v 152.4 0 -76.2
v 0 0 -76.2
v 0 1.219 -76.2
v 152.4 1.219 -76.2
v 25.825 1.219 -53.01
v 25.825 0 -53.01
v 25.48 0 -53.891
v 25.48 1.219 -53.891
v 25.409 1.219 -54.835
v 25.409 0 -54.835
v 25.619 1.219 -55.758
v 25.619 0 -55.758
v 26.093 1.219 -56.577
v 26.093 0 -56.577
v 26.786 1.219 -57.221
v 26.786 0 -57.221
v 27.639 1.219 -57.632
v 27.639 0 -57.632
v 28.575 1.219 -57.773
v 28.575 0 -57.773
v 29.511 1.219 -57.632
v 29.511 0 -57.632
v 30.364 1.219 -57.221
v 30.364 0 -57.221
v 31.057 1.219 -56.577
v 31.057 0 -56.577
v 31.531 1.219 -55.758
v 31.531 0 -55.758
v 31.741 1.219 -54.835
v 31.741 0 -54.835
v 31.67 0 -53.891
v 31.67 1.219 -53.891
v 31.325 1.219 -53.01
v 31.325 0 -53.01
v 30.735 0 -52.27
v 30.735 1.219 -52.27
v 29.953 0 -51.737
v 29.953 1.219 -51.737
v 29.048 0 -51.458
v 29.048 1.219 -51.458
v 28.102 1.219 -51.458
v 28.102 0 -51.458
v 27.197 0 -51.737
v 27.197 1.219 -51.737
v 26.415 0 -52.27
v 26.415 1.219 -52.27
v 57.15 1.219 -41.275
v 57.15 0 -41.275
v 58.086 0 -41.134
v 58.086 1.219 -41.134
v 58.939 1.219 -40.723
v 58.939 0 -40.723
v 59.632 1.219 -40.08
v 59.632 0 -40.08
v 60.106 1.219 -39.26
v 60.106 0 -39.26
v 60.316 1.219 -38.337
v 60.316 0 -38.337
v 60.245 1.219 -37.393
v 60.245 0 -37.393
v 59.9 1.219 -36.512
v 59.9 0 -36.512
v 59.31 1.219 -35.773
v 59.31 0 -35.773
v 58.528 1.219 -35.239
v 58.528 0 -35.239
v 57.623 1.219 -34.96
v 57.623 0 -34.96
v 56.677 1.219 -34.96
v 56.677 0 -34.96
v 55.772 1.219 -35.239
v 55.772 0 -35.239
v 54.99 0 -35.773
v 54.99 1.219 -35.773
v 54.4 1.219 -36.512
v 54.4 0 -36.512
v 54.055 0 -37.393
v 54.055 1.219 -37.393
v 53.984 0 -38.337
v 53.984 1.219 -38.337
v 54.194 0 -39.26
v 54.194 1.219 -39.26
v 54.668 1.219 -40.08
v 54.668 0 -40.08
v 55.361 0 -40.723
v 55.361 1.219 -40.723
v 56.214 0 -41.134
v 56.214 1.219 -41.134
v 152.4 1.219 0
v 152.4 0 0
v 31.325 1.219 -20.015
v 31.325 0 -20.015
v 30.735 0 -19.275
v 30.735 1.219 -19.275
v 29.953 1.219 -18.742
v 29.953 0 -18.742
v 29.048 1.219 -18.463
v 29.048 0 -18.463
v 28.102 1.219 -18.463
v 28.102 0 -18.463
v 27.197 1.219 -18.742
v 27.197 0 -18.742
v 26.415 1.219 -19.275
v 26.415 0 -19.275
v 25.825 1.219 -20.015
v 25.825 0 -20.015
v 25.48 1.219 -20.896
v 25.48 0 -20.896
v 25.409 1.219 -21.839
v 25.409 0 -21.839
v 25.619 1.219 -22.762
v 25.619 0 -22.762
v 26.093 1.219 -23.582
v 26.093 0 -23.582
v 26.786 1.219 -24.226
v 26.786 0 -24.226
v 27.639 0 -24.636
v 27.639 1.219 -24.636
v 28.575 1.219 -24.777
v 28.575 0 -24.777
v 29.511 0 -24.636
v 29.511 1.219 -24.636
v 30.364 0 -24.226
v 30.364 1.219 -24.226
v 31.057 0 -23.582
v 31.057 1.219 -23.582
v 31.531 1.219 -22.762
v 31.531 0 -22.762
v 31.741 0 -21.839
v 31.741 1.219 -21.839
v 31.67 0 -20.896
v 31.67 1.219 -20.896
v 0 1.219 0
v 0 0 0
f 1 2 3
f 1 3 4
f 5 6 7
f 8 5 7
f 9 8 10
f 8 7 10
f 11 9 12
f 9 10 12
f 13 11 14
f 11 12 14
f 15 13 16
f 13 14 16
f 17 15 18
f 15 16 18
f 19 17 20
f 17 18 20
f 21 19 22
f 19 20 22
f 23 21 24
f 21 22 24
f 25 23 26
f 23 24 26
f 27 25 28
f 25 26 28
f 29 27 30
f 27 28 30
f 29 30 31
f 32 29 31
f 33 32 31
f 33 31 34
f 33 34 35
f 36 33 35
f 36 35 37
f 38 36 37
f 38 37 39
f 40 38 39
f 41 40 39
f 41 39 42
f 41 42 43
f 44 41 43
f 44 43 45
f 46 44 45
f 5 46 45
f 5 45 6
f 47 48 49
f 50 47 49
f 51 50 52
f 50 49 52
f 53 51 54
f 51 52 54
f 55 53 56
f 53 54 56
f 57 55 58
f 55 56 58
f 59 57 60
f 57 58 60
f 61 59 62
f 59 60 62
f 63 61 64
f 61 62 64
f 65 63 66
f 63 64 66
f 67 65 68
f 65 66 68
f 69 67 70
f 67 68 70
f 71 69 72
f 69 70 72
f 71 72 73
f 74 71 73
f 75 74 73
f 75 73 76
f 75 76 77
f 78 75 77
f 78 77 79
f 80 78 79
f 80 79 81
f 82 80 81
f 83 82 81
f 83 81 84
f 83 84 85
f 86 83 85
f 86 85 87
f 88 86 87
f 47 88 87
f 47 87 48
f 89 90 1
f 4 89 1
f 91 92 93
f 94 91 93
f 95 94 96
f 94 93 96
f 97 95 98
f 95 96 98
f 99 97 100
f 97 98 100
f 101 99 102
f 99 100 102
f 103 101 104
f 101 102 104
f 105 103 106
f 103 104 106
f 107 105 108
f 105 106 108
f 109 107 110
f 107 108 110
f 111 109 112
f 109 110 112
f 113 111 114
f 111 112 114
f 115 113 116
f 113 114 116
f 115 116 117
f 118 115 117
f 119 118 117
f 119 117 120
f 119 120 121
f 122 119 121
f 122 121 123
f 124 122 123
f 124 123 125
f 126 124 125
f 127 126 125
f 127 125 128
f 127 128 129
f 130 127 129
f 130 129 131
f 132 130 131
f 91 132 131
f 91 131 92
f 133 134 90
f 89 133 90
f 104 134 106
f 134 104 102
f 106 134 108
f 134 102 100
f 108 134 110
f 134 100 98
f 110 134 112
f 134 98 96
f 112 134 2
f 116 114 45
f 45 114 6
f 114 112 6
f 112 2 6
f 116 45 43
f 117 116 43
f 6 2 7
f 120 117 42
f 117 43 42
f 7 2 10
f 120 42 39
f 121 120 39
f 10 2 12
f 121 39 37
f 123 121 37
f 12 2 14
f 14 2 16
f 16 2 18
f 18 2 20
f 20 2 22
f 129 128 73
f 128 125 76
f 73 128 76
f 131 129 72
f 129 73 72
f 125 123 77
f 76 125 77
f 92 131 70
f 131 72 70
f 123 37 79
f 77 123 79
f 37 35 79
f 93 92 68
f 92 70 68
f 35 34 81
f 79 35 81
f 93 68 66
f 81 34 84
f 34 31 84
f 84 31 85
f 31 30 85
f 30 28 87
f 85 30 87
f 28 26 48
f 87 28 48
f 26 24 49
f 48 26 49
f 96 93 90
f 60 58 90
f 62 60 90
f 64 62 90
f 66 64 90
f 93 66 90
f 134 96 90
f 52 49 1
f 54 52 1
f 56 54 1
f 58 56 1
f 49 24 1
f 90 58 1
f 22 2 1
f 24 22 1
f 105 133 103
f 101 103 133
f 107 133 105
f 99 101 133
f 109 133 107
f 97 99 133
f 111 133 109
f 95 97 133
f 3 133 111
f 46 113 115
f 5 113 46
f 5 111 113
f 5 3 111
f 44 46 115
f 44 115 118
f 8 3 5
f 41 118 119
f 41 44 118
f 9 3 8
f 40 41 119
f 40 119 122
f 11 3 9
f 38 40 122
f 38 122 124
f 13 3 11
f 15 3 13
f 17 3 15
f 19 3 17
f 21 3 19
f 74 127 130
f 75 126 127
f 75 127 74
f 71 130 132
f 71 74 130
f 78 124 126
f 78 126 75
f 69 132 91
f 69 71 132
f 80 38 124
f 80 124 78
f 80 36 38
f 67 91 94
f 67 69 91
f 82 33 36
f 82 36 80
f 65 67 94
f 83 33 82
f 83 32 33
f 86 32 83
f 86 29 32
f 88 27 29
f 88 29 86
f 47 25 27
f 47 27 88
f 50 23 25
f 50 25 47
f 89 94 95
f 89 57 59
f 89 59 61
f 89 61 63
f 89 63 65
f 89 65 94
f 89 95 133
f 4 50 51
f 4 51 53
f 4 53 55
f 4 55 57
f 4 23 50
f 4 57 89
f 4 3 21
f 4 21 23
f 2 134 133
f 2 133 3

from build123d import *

# Parameters (mm, degrees)
SKETCH2_W                   = 152.4
SKETCH2_H                   = 76.2
BASE_FLANGE1_DEPTH          = 1.2192
F_1_4_0_25_DIAMETER_HOLE1_D = 6.35
CIRPATTERN1_COUNT           = 3


# Sheet-metal steps are written as plain solids
with BuildPart() as part:
    # Sketch2 → Base-Flange1 (new body)
    with BuildSketch(Plane(origin=(0, 0, 0), x_dir=(1, 0, 0), z_dir=(0, 1, 0))):
        with Locations((76.2, 38.1)):
            Rectangle(SKETCH2_W, SKETCH2_H)
    extrude(amount=BASE_FLANGE1_DEPTH)

    # 1/4 (0.25) Diameter Hole1 (through all)
    with Locations(Plane(origin=(57.15, 1.2192, -38.1), x_dir=(0, 0, 1), z_dir=(0, 1, 0))):
        with Locations((0, 0)):
            f_1_4_0_25_diameter_hole1 = Hole(F_1_4_0_25_DIAMETER_HOLE1_D / 2)

    # CirPattern1: 1/4 (0.25) Diameter Hole1 ×3 about axis
    cirpattern1_axis = Axis((38.1, 0, -38.1), (0, 1, 0))
    for i in range(1, CIRPATTERN1_COUNT):
        add(f_1_4_0_25_diameter_hole1.rotate(cirpattern1_axis, i * 360 / CIRPATTERN1_COUNT), mode=Mode.SUBTRACT)


solid = part.part
